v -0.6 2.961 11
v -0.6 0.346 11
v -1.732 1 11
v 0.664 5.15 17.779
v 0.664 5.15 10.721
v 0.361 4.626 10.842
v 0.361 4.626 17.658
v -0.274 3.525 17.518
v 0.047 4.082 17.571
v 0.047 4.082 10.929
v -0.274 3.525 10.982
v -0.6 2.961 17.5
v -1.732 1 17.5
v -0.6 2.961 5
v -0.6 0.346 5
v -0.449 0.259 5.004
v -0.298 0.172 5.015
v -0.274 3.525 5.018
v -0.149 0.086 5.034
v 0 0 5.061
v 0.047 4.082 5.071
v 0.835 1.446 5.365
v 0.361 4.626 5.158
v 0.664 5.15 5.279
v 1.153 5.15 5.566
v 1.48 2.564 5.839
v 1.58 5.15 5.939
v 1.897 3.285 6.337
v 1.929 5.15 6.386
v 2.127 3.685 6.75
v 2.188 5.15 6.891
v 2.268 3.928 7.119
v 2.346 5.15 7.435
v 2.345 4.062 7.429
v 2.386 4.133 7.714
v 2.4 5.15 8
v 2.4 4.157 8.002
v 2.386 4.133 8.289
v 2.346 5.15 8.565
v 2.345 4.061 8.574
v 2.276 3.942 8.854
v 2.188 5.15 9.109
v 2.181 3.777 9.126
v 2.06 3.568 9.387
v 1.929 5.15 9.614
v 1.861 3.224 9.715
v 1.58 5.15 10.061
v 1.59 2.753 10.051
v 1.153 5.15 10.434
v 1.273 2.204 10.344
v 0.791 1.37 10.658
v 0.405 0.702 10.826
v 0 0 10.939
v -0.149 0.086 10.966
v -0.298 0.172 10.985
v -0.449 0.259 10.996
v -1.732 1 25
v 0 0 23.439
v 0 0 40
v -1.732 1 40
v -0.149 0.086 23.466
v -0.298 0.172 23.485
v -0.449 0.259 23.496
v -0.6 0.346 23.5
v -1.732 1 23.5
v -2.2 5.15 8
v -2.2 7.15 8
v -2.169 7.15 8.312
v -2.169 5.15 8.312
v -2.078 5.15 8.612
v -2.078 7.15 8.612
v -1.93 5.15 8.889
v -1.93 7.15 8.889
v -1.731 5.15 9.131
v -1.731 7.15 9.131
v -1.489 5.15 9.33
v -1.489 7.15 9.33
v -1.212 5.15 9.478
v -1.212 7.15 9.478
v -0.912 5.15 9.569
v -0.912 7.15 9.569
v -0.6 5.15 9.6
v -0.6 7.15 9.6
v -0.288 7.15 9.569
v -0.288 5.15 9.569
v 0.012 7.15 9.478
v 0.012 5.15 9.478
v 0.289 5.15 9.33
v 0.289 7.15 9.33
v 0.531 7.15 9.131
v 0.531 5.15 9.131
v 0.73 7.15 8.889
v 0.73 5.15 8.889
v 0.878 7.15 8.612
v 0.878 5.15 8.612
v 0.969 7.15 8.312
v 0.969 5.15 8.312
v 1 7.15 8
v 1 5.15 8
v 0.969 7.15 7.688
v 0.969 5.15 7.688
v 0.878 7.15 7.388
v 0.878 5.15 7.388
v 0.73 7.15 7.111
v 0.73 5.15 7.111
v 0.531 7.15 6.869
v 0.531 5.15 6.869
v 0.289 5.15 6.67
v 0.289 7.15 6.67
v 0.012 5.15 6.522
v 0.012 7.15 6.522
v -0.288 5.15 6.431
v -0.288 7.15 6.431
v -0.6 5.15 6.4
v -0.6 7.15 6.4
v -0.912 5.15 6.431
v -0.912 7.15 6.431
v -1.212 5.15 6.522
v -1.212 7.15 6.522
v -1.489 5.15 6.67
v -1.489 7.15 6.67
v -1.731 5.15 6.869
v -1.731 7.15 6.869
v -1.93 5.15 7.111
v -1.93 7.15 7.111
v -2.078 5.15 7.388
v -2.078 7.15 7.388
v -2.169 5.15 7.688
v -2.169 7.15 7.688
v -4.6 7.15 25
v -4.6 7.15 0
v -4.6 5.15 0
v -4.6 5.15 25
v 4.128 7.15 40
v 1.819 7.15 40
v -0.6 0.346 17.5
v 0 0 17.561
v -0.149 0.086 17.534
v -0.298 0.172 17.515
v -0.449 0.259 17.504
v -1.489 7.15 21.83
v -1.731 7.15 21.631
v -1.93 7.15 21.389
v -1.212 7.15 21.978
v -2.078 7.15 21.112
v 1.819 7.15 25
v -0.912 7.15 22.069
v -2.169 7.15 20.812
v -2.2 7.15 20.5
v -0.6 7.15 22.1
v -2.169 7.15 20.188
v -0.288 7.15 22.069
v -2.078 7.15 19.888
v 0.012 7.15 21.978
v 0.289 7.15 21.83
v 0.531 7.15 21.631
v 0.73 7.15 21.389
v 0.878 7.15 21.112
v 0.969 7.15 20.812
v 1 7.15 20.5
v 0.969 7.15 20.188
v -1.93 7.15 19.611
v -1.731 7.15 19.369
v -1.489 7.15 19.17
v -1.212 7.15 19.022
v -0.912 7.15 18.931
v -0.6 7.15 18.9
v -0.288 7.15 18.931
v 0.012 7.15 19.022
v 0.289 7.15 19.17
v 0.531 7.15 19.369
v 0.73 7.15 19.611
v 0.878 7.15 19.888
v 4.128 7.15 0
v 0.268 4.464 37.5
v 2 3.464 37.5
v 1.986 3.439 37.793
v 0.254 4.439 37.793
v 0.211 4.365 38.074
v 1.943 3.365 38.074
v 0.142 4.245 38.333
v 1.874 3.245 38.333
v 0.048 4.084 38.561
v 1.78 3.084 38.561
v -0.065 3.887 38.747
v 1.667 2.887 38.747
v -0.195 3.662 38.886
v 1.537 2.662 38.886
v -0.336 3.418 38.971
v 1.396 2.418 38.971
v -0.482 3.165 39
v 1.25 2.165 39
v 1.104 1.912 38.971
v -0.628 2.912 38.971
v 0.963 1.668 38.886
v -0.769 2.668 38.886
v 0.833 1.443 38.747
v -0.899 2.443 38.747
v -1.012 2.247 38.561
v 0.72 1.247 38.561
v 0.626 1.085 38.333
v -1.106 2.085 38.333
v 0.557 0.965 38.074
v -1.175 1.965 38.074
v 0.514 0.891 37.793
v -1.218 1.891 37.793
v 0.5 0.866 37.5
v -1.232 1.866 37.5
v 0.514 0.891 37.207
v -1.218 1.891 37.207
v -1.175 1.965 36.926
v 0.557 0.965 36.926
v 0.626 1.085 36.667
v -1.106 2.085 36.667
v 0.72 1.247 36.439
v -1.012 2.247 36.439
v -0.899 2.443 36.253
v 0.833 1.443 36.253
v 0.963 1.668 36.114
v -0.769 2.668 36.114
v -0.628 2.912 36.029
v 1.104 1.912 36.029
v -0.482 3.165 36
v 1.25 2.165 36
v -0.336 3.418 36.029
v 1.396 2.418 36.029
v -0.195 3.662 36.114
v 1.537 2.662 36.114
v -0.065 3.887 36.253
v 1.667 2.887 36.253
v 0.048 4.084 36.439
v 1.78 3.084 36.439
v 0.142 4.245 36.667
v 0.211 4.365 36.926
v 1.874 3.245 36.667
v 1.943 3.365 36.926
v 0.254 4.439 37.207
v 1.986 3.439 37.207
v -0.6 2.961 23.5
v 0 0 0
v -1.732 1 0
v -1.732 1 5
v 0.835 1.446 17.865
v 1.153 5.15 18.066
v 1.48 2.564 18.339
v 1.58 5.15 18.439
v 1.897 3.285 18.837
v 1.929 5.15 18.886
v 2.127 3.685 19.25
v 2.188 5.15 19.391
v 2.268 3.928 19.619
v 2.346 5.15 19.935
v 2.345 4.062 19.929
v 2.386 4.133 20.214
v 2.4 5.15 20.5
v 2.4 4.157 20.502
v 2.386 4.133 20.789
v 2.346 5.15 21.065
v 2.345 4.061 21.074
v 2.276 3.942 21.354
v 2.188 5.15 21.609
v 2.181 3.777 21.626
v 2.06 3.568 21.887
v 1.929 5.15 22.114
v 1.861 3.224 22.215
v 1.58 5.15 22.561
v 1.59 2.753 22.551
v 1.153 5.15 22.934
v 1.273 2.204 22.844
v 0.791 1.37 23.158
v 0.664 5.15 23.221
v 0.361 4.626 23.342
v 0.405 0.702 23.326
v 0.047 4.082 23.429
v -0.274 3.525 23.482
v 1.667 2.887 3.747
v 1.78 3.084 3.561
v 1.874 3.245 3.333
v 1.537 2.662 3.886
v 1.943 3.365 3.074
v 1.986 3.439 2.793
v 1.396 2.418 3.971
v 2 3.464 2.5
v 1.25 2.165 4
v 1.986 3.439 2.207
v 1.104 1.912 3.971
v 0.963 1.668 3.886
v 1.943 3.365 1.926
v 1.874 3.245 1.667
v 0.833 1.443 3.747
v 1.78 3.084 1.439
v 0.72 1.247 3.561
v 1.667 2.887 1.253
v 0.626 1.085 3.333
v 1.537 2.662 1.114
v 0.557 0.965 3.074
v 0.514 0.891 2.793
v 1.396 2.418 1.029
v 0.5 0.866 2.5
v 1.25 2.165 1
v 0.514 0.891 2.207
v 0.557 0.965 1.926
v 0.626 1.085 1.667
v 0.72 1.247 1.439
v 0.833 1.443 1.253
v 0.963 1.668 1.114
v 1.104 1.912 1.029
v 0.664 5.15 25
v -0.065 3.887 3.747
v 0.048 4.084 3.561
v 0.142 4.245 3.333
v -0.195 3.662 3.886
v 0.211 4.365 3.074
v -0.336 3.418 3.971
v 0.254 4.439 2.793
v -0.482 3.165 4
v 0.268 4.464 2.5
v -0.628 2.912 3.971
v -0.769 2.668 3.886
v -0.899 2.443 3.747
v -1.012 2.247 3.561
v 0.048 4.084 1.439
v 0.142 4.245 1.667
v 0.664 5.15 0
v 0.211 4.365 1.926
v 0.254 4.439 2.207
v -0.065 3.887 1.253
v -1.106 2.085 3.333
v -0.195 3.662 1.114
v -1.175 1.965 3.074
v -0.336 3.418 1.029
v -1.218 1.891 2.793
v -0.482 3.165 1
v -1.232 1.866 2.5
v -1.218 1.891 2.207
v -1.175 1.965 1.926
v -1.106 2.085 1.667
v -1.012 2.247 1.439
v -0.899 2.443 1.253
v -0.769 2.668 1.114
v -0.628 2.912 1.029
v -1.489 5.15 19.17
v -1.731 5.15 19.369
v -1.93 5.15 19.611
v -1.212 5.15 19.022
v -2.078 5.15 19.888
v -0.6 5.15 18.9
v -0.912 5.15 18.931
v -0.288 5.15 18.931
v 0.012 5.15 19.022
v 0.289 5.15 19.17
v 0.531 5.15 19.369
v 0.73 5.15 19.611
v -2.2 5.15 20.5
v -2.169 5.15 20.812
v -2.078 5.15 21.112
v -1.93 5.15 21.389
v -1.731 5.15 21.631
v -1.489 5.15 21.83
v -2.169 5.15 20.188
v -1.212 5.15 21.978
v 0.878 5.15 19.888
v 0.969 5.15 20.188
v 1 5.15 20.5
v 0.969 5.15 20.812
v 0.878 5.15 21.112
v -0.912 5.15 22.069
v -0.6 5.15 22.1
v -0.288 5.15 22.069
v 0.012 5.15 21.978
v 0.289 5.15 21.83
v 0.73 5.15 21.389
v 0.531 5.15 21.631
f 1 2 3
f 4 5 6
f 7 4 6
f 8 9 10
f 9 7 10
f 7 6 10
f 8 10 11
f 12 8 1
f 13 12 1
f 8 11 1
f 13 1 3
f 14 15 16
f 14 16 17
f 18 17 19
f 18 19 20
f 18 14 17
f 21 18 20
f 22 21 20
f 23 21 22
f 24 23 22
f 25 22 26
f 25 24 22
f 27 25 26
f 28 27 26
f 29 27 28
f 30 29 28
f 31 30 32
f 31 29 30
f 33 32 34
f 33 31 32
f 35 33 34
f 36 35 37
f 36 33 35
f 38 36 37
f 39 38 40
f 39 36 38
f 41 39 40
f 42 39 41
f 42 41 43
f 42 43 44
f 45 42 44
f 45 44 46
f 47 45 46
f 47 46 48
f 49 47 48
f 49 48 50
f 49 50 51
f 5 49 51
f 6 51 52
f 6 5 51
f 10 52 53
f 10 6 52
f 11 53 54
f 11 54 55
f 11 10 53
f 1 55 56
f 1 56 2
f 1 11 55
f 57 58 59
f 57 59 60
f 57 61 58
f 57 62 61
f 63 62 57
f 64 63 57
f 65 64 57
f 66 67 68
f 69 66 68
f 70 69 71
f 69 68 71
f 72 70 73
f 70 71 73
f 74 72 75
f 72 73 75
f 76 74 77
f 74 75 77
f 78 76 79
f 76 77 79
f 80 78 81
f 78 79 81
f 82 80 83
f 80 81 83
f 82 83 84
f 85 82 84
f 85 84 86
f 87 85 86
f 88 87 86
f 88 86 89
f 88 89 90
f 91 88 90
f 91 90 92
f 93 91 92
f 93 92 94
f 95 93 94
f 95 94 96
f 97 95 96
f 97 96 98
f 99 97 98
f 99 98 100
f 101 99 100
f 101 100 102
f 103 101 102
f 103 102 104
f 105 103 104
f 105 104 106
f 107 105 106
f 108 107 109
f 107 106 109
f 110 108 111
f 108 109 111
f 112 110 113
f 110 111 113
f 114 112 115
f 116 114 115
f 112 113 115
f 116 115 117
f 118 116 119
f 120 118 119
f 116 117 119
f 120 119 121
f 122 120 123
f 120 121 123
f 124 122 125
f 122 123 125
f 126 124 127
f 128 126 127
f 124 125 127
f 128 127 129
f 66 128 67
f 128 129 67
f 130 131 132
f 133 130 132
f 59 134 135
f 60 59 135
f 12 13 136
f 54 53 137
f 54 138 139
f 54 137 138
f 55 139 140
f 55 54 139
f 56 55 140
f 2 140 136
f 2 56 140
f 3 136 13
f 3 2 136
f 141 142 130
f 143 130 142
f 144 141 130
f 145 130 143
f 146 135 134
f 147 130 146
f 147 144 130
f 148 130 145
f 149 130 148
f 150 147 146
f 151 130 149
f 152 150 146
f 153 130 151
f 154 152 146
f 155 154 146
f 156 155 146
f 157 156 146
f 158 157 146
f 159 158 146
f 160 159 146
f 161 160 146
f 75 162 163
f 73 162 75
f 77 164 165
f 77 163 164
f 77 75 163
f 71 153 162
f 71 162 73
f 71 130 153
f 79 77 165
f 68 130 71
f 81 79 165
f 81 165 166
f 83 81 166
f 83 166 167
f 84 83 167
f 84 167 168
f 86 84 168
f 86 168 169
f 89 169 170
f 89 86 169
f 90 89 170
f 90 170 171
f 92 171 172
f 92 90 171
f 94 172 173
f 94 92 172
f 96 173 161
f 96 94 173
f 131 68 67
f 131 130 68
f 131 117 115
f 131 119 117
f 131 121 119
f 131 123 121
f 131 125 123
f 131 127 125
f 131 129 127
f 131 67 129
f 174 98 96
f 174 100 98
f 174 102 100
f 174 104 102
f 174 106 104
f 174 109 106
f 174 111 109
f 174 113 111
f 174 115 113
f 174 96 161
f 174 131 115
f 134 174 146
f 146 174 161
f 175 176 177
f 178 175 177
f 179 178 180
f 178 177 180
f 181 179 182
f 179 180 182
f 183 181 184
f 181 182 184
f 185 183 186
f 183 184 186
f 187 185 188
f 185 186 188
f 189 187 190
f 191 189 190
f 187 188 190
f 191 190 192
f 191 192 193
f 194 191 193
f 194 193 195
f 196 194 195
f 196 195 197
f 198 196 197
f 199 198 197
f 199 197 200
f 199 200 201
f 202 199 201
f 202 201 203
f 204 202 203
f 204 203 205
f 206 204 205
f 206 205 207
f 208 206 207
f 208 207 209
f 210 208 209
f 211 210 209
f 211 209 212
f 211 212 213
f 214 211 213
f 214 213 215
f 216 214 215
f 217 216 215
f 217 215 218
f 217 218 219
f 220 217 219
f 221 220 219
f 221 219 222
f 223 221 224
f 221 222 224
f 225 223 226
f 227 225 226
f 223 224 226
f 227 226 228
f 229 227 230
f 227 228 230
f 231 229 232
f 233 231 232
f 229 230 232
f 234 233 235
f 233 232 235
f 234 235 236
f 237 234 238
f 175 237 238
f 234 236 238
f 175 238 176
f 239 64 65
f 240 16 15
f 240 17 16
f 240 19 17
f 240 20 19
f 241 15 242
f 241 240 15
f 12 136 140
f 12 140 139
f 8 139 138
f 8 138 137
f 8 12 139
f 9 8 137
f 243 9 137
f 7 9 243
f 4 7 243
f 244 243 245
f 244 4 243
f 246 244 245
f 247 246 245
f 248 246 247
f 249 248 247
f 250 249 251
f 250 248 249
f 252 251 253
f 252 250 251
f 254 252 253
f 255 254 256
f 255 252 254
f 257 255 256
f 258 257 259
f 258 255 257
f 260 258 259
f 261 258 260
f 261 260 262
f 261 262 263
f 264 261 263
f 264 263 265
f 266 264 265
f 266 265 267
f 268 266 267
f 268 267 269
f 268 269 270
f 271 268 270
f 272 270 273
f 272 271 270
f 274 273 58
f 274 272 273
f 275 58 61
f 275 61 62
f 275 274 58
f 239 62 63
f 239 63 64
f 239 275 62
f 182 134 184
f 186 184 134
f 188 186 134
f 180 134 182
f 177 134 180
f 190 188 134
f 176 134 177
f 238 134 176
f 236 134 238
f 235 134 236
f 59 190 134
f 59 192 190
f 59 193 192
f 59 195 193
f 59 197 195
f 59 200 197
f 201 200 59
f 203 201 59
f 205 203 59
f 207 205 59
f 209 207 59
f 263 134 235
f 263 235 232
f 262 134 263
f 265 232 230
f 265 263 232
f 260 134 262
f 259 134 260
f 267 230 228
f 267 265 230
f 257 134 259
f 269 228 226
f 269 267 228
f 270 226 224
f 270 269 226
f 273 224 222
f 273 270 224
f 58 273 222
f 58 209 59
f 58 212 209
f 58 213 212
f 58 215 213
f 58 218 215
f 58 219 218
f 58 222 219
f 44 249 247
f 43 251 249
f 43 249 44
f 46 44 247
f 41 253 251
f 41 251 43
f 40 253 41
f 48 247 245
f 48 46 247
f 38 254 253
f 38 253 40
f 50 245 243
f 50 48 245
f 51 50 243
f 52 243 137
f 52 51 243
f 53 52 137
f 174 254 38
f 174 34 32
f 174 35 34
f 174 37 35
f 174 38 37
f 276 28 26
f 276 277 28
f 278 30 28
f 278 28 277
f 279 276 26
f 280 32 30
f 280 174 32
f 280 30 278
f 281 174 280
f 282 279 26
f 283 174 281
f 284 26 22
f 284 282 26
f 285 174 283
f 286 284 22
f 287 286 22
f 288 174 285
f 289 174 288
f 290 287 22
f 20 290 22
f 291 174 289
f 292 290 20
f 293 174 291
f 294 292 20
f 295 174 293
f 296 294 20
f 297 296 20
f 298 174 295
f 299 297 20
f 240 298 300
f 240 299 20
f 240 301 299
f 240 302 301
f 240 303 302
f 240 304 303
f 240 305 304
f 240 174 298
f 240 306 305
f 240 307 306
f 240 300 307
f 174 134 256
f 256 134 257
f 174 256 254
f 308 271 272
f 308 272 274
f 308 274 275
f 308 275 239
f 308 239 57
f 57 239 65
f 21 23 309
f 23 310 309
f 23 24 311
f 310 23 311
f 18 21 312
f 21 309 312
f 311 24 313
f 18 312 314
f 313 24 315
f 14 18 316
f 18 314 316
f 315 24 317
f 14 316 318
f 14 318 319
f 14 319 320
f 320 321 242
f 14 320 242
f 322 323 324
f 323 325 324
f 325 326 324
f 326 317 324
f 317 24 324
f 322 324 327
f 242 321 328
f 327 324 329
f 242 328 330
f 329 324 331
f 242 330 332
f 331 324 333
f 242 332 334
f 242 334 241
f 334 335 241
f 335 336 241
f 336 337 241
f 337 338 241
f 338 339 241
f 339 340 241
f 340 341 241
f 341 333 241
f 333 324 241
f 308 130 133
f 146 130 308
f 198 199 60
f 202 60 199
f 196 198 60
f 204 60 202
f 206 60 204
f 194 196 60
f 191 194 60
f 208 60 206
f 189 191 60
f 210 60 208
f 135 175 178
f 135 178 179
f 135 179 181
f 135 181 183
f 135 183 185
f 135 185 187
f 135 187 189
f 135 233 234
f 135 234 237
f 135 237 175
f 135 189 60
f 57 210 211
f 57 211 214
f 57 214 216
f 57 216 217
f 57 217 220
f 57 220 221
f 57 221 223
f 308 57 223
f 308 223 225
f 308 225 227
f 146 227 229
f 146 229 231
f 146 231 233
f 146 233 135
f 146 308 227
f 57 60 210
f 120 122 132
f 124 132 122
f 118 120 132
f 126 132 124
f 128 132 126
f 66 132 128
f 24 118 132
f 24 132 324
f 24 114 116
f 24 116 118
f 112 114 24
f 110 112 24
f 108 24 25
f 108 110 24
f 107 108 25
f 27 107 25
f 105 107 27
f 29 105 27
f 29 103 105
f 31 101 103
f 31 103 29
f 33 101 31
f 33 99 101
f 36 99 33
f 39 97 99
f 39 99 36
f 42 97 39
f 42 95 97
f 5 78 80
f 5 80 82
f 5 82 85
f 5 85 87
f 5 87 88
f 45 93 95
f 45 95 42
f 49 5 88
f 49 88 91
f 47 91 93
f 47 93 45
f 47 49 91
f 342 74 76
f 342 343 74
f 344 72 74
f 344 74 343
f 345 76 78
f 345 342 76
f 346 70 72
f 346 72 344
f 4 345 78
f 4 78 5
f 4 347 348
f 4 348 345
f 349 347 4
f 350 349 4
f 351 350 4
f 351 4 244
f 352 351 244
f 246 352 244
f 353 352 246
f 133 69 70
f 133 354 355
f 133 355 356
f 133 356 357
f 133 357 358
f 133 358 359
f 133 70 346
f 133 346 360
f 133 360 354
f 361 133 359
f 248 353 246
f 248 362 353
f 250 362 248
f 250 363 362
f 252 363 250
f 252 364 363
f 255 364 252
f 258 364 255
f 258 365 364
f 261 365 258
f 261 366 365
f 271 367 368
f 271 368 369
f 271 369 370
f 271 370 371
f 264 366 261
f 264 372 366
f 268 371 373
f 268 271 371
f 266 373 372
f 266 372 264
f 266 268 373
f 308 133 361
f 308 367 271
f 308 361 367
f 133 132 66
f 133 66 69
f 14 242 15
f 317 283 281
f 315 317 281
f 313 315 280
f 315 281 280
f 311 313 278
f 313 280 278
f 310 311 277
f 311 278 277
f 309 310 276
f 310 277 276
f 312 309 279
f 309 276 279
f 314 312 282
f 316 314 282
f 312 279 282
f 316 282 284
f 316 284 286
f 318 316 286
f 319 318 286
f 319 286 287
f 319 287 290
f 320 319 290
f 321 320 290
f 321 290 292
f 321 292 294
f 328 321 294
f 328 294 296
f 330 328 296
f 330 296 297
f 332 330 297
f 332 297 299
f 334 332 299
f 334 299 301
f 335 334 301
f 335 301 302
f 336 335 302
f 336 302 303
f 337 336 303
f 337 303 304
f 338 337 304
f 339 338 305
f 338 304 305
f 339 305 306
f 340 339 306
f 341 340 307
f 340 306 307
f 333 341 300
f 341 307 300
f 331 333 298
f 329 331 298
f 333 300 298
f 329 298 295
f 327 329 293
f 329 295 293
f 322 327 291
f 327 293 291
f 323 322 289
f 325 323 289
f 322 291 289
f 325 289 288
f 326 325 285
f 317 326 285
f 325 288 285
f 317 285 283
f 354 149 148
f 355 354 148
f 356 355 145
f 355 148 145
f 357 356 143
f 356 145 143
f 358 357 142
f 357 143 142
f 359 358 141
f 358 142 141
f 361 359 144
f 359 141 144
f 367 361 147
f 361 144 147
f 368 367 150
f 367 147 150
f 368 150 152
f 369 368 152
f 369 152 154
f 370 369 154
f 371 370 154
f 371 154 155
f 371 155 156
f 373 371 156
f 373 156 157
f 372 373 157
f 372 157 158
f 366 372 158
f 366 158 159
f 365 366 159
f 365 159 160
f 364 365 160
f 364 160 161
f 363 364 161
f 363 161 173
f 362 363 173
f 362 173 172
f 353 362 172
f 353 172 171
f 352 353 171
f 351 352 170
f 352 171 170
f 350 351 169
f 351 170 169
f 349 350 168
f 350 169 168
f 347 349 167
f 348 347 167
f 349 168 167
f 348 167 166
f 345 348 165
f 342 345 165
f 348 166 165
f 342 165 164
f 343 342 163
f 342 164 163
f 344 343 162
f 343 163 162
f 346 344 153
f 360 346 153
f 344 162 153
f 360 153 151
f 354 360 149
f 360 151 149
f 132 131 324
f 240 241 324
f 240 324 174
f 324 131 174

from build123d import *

# Parameters (mm, degrees)
BOSS_EXTRUDE1_DEPTH = 25
BOSS_EXTRUDE2_DEPTH = 15
CUT_EXTRUDE1_REACH  = 42.894
SKETCH3_R           = 1.5
CUT_EXTRUDE2_REACH  = 42.894
SKETCH4_R           = 1.6
CUT_EXTRUDE3_DEPTH  = 41.591655546


with BuildPart() as part:
    # Sketch1 → Boss-Extrude1 (new body)
    with BuildSketch(Plane.XY):
        Polygon((0, 0), (4.128054425, 7.15), (-4.6, 7.15), (-4.6, 5.15), (0.66395281, 5.15), (-1.732050808, 1), align=None)
    extrude(amount=BOSS_EXTRUDE1_DEPTH)

    # Sketch2 → Boss-Extrude2 (add)
    with BuildSketch(Plane.XY.offset(25)):
        Polygon((4.128054425, 7.15), (0, 0), (-1.732050808, 1), (1.818653348, 7.15), align=None)
    extrude(amount=BOSS_EXTRUDE2_DEPTH)

    # Sketch3 → Cut-Extrude1 (cut, up to next)
    with BuildSketch(Plane(origin=(0, 0, 0), x_dir=(0, 0, -1), z_dir=(0.8660254037844365, -0.5000000000000039, 0)), mode=Mode.PRIVATE) as cut_extrude1_sk1:
        with Locations(Location((-37.5, 2.5, 0), (0, 0, 90))):
            Circle(SKETCH3_R)
    cut_extrude1_tool1 = extrude(cut_extrude1_sk1.sketch, amount=-CUT_EXTRUDE1_REACH, mode=Mode.PRIVATE) & part.part
    # Sketch3 → Cut-Extrude1 (cut, up to next)
    with BuildSketch(Plane(origin=(0, 0, 0), x_dir=(0, 0, -1), z_dir=(0.8660254037844365, -0.5000000000000039, 0)), mode=Mode.PRIVATE) as cut_extrude1_sk2:
        with Locations(Location((-2.5, 2.5, 0), (0, 0, 90))):
            Circle(SKETCH3_R)
    cut_extrude1_tool2 = extrude(cut_extrude1_sk2.sketch, amount=-CUT_EXTRUDE1_REACH, mode=Mode.PRIVATE) & part.part
    add(cut_extrude1_tool1.solids().sort_by_distance((1.25, 2.165064, 37.5))[0], mode=Mode.SUBTRACT)
    add(cut_extrude1_tool2.solids().sort_by_distance((1.25, 2.165064, 2.5))[0], mode=Mode.SUBTRACT)

    # Sketch4 → Cut-Extrude2 (cut, up to next)
    with BuildSketch(Plane(origin=(0, 7.15, 0), x_dir=(1, 0, 0), z_dir=(0, 1, 0)), mode=Mode.PRIVATE) as cut_extrude2_sk1:
        with Locations(Location((-0.6, -8, 0), (0, 0, 180))):
            Circle(SKETCH4_R)
    cut_extrude2_tool1 = extrude(cut_extrude2_sk1.sketch, amount=-CUT_EXTRUDE2_REACH, mode=Mode.PRIVATE) & part.part
    # Sketch4 → Cut-Extrude2 (cut, up to next)
    with BuildSketch(Plane(origin=(0, 7.15, 0), x_dir=(1, 0, 0), z_dir=(0, 1, 0)), mode=Mode.PRIVATE) as cut_extrude2_sk2:
        with Locations(Location((-0.6, -20.5, 0), (0, 0, 180))):
            Circle(SKETCH4_R)
    cut_extrude2_tool2 = extrude(cut_extrude2_sk2.sketch, amount=-CUT_EXTRUDE2_REACH, mode=Mode.PRIVATE) & part.part
    add(cut_extrude2_tool1.solids().sort_by_distance((-0.6, 7.15, 8))[0], mode=Mode.SUBTRACT)
    add(cut_extrude2_tool2.solids().sort_by_distance((-0.6, 7.15, 20.5))[0], mode=Mode.SUBTRACT)

    # Sketch5 → Cut-Extrude3 (cut, through all)
    with BuildSketch(Plane.XZ.offset(-5.15)):
        with BuildLine():
            Line((-0.6, 23.5), (-3.6, 23.5))
            Line((-3.6, 23.5), (-3.6, 17.5))
            Line((-3.6, 17.5), (-0.6, 17.5))
            ThreePointArc((-0.6, 17.5), (2.4, 20.5), (-0.6, 23.5))
        make_face()
        with BuildLine():
            Line((-0.6, 11), (-3.6, 11))
            Line((-3.6, 11), (-3.6, 5))
            Line((-3.6, 5), (-0.6, 5))
            ThreePointArc((-0.6, 5), (2.4, 8), (-0.6, 11))
        make_face()
    extrude(amount=CUT_EXTRUDE3_DEPTH, mode=Mode.SUBTRACT)


solid = part.part
